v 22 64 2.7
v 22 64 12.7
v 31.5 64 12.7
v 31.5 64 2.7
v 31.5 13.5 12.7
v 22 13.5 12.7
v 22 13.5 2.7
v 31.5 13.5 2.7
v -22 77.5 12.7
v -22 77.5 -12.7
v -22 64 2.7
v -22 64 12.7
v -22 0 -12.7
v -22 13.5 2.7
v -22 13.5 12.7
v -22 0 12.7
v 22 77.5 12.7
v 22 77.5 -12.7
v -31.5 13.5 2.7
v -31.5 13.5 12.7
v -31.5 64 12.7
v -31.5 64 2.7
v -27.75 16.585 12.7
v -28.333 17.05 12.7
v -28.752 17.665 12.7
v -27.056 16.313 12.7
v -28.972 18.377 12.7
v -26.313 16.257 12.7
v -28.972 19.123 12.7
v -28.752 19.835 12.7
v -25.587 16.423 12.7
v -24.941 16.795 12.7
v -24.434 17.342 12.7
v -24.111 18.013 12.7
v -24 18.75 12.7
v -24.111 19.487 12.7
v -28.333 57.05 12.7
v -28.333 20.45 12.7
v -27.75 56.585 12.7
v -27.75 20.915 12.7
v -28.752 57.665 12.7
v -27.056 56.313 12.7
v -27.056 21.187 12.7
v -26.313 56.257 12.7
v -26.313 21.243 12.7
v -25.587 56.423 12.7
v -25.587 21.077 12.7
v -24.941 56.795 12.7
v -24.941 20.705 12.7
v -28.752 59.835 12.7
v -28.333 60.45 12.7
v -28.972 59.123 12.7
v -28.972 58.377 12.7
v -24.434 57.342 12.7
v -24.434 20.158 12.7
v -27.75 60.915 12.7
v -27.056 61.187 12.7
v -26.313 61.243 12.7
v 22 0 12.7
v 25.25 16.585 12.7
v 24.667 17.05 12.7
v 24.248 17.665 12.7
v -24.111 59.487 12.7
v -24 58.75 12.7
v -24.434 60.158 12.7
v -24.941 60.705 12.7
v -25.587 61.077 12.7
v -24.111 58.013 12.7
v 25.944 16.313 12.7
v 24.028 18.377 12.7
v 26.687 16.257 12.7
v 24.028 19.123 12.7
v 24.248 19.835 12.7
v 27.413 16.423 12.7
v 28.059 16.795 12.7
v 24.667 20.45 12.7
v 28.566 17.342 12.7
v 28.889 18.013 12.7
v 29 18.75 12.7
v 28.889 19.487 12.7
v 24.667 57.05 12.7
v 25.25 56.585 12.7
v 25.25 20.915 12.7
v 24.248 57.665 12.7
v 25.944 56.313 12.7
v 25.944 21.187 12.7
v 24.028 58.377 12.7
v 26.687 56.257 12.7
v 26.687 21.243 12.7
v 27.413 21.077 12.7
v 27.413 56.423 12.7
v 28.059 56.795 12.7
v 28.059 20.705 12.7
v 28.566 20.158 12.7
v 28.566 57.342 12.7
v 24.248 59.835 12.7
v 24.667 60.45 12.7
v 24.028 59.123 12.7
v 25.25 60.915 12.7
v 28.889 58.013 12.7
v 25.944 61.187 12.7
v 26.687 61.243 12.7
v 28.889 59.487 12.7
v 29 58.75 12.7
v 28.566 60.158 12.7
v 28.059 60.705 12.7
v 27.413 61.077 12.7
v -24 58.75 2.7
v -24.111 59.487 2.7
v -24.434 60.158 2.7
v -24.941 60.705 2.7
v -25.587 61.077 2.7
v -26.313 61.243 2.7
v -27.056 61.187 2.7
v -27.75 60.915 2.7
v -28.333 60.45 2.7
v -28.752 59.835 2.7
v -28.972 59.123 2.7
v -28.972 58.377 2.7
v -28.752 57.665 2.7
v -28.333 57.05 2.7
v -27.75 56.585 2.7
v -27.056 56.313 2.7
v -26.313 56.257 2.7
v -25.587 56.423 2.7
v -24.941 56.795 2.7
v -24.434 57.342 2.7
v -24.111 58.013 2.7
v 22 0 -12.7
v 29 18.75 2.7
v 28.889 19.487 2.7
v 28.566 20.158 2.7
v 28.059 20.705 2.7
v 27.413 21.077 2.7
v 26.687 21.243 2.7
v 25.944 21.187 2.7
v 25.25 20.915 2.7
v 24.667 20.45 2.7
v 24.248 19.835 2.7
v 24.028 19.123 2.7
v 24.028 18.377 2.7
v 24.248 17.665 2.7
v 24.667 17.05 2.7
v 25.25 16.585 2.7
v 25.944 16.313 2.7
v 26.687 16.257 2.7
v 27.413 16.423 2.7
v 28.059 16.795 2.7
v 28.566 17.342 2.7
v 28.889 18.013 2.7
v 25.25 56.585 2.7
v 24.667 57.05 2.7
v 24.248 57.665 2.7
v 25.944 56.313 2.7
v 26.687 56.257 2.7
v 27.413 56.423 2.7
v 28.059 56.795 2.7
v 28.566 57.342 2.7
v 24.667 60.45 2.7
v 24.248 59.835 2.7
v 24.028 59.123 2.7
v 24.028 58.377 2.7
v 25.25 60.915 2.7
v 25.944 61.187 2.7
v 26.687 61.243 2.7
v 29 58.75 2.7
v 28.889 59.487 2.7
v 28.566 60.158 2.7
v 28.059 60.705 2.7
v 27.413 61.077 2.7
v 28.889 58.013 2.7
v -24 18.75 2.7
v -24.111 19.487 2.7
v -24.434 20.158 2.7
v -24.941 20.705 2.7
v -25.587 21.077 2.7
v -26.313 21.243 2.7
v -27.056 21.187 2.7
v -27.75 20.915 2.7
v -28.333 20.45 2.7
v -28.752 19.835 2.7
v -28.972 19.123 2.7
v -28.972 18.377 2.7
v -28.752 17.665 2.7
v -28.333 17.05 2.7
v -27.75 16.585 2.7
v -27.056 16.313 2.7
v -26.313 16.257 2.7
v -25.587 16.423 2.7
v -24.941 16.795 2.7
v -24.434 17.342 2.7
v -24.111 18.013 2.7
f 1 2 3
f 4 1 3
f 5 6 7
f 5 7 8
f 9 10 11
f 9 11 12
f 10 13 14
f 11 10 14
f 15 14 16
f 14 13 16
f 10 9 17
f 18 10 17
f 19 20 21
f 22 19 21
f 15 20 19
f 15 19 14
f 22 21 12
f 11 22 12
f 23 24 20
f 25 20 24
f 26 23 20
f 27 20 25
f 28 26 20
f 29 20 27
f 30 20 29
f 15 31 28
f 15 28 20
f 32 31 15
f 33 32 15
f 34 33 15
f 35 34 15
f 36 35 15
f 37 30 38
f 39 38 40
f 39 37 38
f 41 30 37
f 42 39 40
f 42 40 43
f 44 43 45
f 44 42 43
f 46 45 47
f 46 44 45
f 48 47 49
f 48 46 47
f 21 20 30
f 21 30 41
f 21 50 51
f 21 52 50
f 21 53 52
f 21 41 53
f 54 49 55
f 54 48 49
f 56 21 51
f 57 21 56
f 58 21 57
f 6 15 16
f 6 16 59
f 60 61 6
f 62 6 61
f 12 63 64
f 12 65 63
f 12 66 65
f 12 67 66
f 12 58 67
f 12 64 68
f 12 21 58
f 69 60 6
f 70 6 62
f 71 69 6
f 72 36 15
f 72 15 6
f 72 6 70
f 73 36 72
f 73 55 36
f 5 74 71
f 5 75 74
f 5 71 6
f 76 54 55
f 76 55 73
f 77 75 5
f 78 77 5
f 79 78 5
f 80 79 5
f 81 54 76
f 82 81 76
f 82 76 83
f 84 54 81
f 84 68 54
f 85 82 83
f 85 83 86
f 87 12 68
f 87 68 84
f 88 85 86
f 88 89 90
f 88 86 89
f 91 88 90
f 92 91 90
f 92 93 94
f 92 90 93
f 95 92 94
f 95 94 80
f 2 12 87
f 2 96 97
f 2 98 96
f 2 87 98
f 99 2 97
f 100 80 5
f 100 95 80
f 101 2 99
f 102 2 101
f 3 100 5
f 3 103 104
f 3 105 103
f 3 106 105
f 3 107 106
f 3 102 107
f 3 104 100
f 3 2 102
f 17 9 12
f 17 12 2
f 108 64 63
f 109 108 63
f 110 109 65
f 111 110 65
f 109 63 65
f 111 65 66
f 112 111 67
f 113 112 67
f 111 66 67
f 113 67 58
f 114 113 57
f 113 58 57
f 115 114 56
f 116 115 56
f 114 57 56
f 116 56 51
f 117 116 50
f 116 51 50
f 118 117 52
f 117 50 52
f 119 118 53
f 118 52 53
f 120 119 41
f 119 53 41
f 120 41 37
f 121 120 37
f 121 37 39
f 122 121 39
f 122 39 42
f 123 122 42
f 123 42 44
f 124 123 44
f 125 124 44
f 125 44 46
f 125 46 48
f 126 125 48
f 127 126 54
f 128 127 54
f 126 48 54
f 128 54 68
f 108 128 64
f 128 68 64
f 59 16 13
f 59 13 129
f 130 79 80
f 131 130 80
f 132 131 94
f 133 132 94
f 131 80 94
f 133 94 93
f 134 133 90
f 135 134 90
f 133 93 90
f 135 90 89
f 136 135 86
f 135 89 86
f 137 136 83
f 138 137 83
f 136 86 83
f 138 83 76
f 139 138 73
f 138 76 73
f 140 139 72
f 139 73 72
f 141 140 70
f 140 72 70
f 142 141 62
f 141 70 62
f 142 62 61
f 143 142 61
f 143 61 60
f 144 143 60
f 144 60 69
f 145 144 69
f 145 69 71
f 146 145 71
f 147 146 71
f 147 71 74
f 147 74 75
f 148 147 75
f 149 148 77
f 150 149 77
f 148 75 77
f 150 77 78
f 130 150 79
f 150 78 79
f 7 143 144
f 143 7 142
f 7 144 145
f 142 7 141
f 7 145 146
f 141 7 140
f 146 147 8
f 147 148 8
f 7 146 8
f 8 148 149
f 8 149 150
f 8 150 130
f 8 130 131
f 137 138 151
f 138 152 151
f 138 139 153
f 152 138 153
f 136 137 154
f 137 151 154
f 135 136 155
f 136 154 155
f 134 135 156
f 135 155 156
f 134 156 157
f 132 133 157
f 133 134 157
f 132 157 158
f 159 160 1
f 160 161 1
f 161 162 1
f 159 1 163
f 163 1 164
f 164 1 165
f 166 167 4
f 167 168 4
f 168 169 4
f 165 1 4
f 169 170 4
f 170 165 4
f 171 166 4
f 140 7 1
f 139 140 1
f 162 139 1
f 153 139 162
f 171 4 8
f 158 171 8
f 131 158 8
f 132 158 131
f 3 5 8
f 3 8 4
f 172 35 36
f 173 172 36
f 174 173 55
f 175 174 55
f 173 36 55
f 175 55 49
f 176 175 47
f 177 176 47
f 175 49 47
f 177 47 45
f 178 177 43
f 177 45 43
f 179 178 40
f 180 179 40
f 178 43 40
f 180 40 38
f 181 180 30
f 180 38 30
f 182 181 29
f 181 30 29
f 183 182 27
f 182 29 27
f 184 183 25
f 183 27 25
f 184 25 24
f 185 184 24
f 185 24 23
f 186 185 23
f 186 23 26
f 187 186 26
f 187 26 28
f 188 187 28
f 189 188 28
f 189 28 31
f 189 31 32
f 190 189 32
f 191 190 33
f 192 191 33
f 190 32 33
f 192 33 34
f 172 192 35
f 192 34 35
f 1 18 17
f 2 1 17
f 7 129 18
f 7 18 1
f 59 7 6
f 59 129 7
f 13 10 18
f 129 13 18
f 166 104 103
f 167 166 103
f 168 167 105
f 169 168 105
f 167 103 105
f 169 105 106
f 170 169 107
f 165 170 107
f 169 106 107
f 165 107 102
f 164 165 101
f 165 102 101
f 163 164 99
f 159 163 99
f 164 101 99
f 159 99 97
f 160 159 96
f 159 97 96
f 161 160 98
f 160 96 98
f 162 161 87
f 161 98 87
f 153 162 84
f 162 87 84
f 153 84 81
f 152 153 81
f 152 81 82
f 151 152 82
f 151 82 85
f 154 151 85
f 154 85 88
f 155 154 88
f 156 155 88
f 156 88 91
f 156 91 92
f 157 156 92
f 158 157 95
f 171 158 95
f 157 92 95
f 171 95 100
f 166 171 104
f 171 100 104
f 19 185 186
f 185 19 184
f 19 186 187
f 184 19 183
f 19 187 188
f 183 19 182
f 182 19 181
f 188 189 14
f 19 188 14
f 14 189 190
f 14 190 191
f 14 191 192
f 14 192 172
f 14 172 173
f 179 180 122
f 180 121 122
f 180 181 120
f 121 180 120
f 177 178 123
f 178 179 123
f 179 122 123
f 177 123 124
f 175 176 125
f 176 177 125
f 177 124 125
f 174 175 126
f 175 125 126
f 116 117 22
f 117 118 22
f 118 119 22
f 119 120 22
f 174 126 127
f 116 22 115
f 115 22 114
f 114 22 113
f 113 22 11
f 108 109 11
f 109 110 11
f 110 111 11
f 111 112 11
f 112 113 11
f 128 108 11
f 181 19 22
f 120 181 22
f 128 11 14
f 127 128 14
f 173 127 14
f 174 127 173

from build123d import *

# Parameters (mm, degrees)
F0_W     = 44
F0_H     = 25.4
F1_DEPTH = 77.5
F3_W     = 63
F3_H     = 50.5
F3_R     = 2.5
F2_W     = 44
F2_H     = 77.5
F4_DEPTH = 10


with BuildPart() as f1:
    # F0 (on Front) → F1 (new body)
    with BuildSketch(Plane.XZ):
        Rectangle(F0_W, F0_H)
    extrude(amount=-F1_DEPTH)

    # F3 (on face) + F2 (on face) → F4 (join)
    with BuildSketch(Plane.XY.offset(12.7)):
        with Locations((0, 38.75)):
            Rectangle(F3_W, F3_H)
        with Locations((-26.5, 18.75)):
            Circle(F3_R, mode=Mode.SUBTRACT)
        with Locations((26.5, 18.75)):
            Circle(F3_R, mode=Mode.SUBTRACT)
        with Locations((-26.5, 58.75)):
            Circle(F3_R, mode=Mode.SUBTRACT)
        with Locations((26.5, 58.75)):
            Circle(F3_R, mode=Mode.SUBTRACT)
    with BuildSketch(Plane.XY.offset(12.7)):
        with Locations((0, 38.75)):
            Rectangle(F2_W, F2_H)
    extrude(amount=-F4_DEPTH)


solid = f1.part
